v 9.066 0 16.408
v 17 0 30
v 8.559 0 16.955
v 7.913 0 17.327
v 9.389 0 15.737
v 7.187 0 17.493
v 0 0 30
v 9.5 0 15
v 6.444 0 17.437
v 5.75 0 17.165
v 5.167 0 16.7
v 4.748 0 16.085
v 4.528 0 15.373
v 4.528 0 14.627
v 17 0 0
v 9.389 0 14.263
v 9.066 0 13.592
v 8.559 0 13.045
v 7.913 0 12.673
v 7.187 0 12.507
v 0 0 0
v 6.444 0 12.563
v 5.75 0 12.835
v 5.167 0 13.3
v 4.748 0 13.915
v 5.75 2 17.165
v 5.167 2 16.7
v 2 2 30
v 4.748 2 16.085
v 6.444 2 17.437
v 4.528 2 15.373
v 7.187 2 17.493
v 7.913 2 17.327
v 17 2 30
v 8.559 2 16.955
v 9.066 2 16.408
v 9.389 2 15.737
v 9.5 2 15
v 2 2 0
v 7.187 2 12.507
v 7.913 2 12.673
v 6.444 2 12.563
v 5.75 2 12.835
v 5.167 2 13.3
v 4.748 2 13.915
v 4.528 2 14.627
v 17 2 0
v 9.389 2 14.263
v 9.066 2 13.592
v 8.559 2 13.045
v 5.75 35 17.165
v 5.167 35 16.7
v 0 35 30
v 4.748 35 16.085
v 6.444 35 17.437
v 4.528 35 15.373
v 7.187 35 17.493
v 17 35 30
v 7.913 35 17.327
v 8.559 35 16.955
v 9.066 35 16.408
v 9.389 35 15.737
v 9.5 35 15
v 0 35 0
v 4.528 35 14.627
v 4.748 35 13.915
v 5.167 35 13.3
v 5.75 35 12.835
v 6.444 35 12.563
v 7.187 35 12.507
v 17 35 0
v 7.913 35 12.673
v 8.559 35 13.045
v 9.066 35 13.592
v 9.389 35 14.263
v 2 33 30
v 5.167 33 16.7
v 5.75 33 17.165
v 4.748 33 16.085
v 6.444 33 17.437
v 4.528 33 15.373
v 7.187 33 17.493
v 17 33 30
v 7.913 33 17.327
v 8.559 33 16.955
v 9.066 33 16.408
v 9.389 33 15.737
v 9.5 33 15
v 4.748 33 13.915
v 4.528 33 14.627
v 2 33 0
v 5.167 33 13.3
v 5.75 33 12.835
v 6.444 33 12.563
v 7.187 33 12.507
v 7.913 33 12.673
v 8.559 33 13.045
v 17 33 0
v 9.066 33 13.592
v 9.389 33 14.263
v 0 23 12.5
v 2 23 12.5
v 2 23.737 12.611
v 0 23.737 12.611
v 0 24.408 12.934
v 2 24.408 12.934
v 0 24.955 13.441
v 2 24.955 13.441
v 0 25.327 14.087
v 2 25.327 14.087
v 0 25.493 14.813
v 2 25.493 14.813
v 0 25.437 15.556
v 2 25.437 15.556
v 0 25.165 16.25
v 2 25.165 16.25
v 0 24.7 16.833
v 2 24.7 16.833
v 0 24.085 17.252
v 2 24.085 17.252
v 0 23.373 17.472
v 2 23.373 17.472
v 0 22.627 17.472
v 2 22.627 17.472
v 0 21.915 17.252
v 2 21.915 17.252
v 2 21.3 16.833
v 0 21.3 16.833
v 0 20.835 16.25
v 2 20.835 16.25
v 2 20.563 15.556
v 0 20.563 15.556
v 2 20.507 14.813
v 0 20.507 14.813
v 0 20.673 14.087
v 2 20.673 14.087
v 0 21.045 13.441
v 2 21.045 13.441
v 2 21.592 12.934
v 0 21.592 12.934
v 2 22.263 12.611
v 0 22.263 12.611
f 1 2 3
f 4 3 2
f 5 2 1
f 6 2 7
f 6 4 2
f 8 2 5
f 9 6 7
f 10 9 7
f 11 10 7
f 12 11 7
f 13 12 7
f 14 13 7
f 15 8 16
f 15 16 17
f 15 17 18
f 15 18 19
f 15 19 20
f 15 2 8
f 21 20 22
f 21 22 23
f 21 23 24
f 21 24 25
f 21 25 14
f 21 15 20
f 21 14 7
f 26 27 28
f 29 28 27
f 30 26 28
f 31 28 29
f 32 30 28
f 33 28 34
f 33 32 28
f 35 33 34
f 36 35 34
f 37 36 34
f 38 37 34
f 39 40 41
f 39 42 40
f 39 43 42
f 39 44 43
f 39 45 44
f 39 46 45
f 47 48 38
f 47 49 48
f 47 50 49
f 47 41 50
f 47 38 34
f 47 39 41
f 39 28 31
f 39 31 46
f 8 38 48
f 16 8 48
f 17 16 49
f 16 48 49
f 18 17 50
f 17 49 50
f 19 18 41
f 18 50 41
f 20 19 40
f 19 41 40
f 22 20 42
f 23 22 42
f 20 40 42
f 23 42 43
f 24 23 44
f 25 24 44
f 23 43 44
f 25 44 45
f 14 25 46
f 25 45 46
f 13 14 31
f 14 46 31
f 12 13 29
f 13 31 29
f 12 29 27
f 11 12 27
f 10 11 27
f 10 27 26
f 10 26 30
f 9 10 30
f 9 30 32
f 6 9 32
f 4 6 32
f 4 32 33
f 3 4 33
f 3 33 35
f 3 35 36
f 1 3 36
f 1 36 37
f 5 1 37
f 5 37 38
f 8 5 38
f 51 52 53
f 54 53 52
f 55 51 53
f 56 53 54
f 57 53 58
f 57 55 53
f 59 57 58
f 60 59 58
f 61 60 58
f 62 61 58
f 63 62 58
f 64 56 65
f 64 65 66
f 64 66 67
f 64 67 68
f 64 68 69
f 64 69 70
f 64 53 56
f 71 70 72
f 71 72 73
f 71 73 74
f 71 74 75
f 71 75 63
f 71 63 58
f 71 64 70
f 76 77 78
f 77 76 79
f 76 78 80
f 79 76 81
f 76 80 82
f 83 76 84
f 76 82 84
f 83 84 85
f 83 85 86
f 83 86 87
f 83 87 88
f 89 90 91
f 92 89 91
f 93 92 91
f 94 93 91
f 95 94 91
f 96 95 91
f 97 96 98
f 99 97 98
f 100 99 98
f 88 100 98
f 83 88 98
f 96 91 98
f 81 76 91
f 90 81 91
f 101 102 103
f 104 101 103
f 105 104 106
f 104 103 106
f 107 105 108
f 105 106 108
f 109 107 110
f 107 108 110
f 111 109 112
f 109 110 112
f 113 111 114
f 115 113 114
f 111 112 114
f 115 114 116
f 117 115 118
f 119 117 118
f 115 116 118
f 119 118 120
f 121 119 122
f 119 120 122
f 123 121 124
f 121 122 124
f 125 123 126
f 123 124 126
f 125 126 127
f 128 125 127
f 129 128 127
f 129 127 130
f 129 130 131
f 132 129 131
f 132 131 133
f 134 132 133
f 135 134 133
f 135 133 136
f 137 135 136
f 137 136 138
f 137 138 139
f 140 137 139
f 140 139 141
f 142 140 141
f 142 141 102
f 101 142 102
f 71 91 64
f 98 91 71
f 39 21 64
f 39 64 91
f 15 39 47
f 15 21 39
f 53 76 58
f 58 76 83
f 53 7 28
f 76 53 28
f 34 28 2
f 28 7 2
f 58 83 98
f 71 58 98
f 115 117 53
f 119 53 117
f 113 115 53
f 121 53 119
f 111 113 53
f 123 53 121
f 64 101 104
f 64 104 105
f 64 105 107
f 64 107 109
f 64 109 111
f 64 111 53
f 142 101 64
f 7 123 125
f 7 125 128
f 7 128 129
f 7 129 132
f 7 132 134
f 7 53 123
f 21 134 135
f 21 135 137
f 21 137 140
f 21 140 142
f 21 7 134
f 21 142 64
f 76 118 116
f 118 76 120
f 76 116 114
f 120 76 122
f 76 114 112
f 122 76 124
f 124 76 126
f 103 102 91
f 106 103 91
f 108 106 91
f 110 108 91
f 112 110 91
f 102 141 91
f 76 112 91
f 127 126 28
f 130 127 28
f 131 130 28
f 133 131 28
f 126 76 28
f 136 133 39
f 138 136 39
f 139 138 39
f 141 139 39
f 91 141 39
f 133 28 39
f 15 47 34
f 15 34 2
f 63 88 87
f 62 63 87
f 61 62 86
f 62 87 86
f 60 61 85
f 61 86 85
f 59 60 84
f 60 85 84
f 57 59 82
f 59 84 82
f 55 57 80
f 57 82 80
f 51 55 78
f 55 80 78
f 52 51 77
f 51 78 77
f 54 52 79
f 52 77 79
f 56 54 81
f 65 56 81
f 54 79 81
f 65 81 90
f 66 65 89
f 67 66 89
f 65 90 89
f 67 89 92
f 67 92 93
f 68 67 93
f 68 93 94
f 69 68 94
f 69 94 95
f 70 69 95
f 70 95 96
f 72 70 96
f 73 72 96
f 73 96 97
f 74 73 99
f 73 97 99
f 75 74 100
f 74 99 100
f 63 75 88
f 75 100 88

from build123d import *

# Parameters (mm, degrees)
BOSS_EXTRUDE1_DEPTH = 30
SKETCH2_R           = 2.5
CUT_EXTRUDE1_DEPTH  = 10
SKETCH3_R           = 2.5
CUT_EXTRUDE2_DEPTH  = 10
SKETCH4_W           = 2
SKETCH4_H           = 30
BOSS_EXTRUDE2_DEPTH = 5
SKETCH5_W           = 17
SKETCH5_H           = 30
BOSS_EXTRUDE3_DEPTH = 2
SKETCH6_R           = 2.5
CUT_EXTRUDE3_DEPTH  = 2


with BuildPart() as part:
    # Sketch1 → Boss-Extrude1 (new body)
    with BuildSketch(Plane.XY):
        Polygon((0, 0), (0, 28), (2, 28), (2, 2), (17, 2), (17, 0), align=None)
    extrude(amount=BOSS_EXTRUDE1_DEPTH)

    # Sketch2 → Cut-Extrude1 (cut)
    with BuildSketch(Plane(origin=(0, 2, 0), x_dir=(1, 0, 0), z_dir=(0, 1, 0))):
        with Locations((7, -15)):
            Circle(SKETCH2_R)
    extrude(amount=-CUT_EXTRUDE1_DEPTH, mode=Mode.SUBTRACT)

    # Sketch3 → Cut-Extrude2 (cut)
    with BuildSketch(Plane(origin=(2, 0, 0), x_dir=(0, 0, -1), z_dir=(1, 0, 0))):
        with Locations((-15, 23)):
            Circle(SKETCH3_R)
    extrude(amount=-CUT_EXTRUDE2_DEPTH, mode=Mode.SUBTRACT)

    # Sketch4 → Boss-Extrude2 (add)
    with BuildSketch(Plane(origin=(0, 28, 0), x_dir=(1, 0, 0), z_dir=(0, 1, 0))):
        with Locations((1, -15)):
            Rectangle(SKETCH4_W, SKETCH4_H)
    extrude(amount=BOSS_EXTRUDE2_DEPTH)

    # Sketch5 → Boss-Extrude3 (add)
    with BuildSketch(Plane(origin=(0, 33, 0), x_dir=(1, 0, 0), z_dir=(0, 1, 0))):
        with Locations((8.5, -15)):
            Rectangle(SKETCH5_W, SKETCH5_H)
    extrude(amount=BOSS_EXTRUDE3_DEPTH)

    # Sketch6 → Cut-Extrude3 (cut)
    with BuildSketch(Plane.XZ.offset(-33)):
        with Locations((7, 15)):
            Circle(SKETCH6_R)
    extrude(amount=-CUT_EXTRUDE3_DEPTH, mode=Mode.SUBTRACT)


solid = part.part
